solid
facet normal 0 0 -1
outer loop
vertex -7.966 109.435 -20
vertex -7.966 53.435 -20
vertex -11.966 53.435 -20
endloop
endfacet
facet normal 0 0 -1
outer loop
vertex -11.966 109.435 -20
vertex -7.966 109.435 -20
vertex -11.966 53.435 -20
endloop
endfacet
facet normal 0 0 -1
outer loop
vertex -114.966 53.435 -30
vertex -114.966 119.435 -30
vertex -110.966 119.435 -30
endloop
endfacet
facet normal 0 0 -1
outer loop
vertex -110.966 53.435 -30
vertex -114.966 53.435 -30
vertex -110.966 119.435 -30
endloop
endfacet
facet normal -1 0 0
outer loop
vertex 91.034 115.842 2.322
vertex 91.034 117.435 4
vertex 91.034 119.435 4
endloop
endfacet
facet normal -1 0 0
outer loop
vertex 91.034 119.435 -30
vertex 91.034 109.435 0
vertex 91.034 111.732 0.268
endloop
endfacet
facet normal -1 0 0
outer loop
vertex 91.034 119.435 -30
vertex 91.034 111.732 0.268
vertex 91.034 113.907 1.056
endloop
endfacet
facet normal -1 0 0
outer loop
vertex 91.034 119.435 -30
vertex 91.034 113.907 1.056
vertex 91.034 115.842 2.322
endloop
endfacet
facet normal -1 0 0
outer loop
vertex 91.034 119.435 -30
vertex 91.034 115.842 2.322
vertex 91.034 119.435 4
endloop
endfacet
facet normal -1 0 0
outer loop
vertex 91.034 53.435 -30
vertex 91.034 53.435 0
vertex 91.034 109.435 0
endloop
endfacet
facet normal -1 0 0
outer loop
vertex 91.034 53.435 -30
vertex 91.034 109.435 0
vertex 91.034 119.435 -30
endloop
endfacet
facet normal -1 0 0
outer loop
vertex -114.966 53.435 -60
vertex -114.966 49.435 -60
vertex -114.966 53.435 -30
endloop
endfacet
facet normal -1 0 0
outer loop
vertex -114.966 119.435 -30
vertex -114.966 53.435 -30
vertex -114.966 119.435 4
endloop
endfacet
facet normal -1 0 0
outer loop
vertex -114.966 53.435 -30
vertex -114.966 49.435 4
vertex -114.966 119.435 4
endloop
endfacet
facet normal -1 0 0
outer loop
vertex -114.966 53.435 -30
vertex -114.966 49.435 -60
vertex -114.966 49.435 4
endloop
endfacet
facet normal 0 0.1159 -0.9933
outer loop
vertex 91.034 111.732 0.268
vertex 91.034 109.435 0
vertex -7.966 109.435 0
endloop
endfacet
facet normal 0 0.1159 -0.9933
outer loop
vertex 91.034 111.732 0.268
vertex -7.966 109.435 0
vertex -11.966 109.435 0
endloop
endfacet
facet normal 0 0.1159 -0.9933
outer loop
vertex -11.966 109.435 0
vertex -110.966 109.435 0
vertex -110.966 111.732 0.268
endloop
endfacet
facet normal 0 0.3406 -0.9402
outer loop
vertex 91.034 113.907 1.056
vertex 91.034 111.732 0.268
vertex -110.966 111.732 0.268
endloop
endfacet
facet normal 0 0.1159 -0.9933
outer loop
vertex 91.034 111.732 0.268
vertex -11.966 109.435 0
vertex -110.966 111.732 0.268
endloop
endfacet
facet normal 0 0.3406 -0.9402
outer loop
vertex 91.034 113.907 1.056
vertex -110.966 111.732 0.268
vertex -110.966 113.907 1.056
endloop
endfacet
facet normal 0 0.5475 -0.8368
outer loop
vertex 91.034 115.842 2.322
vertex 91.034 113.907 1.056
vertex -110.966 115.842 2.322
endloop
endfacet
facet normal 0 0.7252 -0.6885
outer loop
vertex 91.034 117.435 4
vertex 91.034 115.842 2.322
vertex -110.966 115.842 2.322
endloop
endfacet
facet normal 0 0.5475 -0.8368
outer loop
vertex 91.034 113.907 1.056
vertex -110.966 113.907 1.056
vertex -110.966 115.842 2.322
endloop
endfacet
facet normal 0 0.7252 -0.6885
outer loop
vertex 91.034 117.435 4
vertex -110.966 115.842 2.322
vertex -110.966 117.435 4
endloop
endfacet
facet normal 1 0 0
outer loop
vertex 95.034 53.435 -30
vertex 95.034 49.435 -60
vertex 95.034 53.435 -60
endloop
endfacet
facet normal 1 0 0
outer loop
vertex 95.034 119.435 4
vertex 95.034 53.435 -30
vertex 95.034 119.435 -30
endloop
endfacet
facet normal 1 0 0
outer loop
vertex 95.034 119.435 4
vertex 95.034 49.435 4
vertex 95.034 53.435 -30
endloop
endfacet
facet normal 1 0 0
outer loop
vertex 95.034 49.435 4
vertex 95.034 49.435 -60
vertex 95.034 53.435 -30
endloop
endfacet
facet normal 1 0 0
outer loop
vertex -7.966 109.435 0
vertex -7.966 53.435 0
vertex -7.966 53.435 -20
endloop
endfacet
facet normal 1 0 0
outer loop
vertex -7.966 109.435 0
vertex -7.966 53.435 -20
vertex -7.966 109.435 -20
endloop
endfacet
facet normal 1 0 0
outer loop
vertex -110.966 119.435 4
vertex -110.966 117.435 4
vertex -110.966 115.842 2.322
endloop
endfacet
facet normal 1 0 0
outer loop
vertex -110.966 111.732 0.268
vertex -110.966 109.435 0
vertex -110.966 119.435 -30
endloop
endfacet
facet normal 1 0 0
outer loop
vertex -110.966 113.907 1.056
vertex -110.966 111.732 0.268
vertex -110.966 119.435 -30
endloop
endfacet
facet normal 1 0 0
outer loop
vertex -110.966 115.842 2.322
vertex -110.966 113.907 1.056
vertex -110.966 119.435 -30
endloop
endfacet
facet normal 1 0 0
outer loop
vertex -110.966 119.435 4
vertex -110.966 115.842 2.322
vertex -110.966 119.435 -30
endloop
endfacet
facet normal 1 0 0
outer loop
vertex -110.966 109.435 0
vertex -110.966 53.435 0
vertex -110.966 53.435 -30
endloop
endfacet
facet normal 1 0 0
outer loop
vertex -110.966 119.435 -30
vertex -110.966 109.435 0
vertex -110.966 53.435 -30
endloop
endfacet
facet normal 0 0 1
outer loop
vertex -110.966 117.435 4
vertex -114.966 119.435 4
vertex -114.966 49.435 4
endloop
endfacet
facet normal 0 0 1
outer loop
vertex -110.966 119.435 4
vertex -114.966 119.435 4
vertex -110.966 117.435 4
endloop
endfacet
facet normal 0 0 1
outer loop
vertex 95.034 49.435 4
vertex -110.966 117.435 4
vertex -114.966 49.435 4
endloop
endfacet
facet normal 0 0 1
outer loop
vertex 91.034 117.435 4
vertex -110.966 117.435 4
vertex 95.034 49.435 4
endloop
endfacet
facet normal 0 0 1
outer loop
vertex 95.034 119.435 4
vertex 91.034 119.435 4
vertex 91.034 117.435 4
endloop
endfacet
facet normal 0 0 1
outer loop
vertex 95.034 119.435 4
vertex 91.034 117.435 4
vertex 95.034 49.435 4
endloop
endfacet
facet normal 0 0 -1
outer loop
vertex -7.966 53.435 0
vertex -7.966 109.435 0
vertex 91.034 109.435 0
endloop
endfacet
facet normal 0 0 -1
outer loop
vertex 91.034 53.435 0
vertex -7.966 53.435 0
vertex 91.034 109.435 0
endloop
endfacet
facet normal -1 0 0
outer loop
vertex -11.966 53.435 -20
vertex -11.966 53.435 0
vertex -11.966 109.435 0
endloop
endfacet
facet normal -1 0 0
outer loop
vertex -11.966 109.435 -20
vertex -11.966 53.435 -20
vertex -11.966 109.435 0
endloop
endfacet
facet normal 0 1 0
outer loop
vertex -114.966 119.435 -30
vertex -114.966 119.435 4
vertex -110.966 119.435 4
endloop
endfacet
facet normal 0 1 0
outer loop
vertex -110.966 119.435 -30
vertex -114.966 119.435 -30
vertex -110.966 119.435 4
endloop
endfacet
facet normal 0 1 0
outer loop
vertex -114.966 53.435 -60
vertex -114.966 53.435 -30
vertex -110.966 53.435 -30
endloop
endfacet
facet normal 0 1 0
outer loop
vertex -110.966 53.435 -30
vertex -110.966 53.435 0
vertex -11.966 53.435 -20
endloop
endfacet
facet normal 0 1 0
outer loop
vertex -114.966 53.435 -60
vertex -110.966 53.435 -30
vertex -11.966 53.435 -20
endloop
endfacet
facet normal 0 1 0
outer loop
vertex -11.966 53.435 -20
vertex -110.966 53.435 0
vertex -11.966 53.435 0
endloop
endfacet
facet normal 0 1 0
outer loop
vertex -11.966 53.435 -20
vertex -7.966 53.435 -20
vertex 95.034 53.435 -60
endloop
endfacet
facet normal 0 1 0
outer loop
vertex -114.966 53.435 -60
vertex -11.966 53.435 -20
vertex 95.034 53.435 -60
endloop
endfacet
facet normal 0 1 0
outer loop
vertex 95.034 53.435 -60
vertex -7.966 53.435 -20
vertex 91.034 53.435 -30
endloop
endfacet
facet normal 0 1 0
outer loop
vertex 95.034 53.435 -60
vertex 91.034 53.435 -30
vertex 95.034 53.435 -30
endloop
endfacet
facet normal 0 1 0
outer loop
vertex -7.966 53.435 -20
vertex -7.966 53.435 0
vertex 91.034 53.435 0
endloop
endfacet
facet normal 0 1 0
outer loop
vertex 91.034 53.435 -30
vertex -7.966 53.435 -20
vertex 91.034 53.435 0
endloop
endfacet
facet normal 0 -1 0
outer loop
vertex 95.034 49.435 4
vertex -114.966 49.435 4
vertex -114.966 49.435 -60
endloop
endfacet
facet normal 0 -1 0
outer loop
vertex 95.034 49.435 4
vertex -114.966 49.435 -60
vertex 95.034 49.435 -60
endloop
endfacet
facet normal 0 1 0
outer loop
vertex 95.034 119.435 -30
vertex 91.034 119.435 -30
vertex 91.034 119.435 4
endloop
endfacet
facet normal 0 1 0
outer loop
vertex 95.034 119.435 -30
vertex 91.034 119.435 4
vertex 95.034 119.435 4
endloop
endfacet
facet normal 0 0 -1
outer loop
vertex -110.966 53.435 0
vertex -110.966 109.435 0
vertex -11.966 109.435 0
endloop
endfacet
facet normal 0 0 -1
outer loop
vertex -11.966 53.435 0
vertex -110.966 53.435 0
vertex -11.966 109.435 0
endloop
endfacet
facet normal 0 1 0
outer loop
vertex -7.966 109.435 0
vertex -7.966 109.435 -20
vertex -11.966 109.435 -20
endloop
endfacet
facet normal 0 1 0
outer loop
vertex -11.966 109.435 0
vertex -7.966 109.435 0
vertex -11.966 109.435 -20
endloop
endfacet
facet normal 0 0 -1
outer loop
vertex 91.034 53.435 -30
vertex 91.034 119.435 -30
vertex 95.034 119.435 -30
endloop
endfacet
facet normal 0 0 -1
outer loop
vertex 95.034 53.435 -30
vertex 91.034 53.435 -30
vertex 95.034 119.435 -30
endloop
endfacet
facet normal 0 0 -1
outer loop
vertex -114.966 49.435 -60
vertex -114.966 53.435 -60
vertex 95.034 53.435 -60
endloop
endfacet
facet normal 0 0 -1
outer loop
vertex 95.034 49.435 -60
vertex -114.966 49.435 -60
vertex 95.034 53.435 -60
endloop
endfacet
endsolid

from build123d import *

# Parameters (mm, degrees)
SKETCH1_W           = 210
SKETCH1_H           = 70
BOSS_EXTRUDE1_DEPTH = 4
SKETCH2_W           = 210
SKETCH2_H           = 4
BOSS_EXTRUDE2_DEPTH = 60
SKETCH3_W           = 4
SKETCH3_H           = 66
BOSS_EXTRUDE3_DEPTH = 30
FILLET1_R           = 10
SKETCH5_W           = 4
SKETCH5_H           = 56
BOSS_EXTRUDE4_DEPTH = 20


with BuildPart() as part:
    # Sketch1 → Boss-Extrude1 (new body)
    with BuildSketch(Plane.XY):
        with Locations((-9.965753425, 84.434931507)):
            Rectangle(SKETCH1_W, SKETCH1_H)
    extrude(amount=BOSS_EXTRUDE1_DEPTH)

    # Sketch2 → Boss-Extrude2 (add)
    with BuildSketch(Plane.XY):
        with Locations((-9.965753425, 51.434931507)):
            Rectangle(SKETCH2_W, SKETCH2_H)
    extrude(amount=-BOSS_EXTRUDE2_DEPTH)

    # Sketch3 → Boss-Extrude3 (add)
    with BuildSketch(Plane.XY):
        with Locations((-112.965753425, 86.434931507)):
            Rectangle(SKETCH3_W, SKETCH3_H)
        with Locations((93.034246575, 86.434931507)):
            Rectangle(SKETCH3_W, SKETCH3_H)
    extrude(amount=-BOSS_EXTRUDE3_DEPTH)

    # Fillet1
    # the kernel refuses this fillet: 10 mm, written as the material it takes off along each edge
    with BuildSketch(Plane(origin=(-110.965753425, 119.434931507, 0), x_dir=(0, 0, 1), z_dir=(1, 0, 0))) as fillet1_piece_1:
        with BuildLine():
            CenterArc((FILLET1_R, FILLET1_R), FILLET1_R, 180, 90)
            Line((0, FILLET1_R), (0, 0))
            Line((0, 0), (FILLET1_R, 0))
        make_face()
    extrude(amount=202, mode=Mode.SUBTRACT)

    # Sketch5 → Boss-Extrude4 (add)
    with BuildSketch(Plane(origin=(0, 0, 0), x_dir=(-1, 0, 0), z_dir=(0, 0, -1))):
        with Locations((9.965753425, 81.434931507)):
            Rectangle(SKETCH5_W, SKETCH5_H)
    extrude(amount=BOSS_EXTRUDE4_DEPTH)


solid = part.part
